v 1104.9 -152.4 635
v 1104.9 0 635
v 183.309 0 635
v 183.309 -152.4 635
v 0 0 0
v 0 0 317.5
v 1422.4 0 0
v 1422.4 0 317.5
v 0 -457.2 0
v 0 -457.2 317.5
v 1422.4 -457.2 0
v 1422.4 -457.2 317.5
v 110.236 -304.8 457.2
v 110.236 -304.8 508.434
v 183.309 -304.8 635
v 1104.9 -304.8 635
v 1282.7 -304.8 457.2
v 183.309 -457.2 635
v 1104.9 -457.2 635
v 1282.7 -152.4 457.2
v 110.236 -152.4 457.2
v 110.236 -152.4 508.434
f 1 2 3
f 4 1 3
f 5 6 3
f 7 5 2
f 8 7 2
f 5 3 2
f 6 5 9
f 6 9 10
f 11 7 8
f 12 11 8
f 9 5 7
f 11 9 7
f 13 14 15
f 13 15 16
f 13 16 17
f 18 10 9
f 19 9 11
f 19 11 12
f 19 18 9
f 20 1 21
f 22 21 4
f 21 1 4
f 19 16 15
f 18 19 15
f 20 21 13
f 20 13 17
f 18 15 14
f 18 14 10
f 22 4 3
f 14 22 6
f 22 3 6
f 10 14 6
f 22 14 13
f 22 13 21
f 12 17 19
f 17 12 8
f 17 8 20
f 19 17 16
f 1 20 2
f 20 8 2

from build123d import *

# Parameters (mm, degrees)
F0_W     = 1422.4
F0_H     = 317.5
F1_DEPTH = 457.2
F2_W     = 73.0727104677
F2_H     = 152.4
F2_W_2   = 207.264
F2_W_3   = 921.5912895323
F3_DEPTH = 177.8


with BuildPart() as f1:
    # F0 (on Front) → F1 (new body)
    with BuildSketch(Plane.XZ):
        with Locations((711.2, 158.75)):
            Rectangle(F0_W, F0_H)
        Polygon((183.3087104677, 635), (0, 317.5), (1422.4, 317.5), (1104.9, 635), align=None)
    extrude(amount=F1_DEPTH)

    # F2 (on face) → F3 (cut)
    with BuildSketch(Plane.XY.offset(635)):
        with Locations((146.7723552339, -228.6)):
            Rectangle(F2_W, F2_H)
        with Locations((1208.532, -228.6)):
            Rectangle(F2_W_2, F2_H)
        with Locations((644.1043552339, -228.6)):
            Rectangle(F2_W_3, F2_H)
    extrude(amount=-F3_DEPTH, mode=Mode.SUBTRACT)


solid = f1.part
